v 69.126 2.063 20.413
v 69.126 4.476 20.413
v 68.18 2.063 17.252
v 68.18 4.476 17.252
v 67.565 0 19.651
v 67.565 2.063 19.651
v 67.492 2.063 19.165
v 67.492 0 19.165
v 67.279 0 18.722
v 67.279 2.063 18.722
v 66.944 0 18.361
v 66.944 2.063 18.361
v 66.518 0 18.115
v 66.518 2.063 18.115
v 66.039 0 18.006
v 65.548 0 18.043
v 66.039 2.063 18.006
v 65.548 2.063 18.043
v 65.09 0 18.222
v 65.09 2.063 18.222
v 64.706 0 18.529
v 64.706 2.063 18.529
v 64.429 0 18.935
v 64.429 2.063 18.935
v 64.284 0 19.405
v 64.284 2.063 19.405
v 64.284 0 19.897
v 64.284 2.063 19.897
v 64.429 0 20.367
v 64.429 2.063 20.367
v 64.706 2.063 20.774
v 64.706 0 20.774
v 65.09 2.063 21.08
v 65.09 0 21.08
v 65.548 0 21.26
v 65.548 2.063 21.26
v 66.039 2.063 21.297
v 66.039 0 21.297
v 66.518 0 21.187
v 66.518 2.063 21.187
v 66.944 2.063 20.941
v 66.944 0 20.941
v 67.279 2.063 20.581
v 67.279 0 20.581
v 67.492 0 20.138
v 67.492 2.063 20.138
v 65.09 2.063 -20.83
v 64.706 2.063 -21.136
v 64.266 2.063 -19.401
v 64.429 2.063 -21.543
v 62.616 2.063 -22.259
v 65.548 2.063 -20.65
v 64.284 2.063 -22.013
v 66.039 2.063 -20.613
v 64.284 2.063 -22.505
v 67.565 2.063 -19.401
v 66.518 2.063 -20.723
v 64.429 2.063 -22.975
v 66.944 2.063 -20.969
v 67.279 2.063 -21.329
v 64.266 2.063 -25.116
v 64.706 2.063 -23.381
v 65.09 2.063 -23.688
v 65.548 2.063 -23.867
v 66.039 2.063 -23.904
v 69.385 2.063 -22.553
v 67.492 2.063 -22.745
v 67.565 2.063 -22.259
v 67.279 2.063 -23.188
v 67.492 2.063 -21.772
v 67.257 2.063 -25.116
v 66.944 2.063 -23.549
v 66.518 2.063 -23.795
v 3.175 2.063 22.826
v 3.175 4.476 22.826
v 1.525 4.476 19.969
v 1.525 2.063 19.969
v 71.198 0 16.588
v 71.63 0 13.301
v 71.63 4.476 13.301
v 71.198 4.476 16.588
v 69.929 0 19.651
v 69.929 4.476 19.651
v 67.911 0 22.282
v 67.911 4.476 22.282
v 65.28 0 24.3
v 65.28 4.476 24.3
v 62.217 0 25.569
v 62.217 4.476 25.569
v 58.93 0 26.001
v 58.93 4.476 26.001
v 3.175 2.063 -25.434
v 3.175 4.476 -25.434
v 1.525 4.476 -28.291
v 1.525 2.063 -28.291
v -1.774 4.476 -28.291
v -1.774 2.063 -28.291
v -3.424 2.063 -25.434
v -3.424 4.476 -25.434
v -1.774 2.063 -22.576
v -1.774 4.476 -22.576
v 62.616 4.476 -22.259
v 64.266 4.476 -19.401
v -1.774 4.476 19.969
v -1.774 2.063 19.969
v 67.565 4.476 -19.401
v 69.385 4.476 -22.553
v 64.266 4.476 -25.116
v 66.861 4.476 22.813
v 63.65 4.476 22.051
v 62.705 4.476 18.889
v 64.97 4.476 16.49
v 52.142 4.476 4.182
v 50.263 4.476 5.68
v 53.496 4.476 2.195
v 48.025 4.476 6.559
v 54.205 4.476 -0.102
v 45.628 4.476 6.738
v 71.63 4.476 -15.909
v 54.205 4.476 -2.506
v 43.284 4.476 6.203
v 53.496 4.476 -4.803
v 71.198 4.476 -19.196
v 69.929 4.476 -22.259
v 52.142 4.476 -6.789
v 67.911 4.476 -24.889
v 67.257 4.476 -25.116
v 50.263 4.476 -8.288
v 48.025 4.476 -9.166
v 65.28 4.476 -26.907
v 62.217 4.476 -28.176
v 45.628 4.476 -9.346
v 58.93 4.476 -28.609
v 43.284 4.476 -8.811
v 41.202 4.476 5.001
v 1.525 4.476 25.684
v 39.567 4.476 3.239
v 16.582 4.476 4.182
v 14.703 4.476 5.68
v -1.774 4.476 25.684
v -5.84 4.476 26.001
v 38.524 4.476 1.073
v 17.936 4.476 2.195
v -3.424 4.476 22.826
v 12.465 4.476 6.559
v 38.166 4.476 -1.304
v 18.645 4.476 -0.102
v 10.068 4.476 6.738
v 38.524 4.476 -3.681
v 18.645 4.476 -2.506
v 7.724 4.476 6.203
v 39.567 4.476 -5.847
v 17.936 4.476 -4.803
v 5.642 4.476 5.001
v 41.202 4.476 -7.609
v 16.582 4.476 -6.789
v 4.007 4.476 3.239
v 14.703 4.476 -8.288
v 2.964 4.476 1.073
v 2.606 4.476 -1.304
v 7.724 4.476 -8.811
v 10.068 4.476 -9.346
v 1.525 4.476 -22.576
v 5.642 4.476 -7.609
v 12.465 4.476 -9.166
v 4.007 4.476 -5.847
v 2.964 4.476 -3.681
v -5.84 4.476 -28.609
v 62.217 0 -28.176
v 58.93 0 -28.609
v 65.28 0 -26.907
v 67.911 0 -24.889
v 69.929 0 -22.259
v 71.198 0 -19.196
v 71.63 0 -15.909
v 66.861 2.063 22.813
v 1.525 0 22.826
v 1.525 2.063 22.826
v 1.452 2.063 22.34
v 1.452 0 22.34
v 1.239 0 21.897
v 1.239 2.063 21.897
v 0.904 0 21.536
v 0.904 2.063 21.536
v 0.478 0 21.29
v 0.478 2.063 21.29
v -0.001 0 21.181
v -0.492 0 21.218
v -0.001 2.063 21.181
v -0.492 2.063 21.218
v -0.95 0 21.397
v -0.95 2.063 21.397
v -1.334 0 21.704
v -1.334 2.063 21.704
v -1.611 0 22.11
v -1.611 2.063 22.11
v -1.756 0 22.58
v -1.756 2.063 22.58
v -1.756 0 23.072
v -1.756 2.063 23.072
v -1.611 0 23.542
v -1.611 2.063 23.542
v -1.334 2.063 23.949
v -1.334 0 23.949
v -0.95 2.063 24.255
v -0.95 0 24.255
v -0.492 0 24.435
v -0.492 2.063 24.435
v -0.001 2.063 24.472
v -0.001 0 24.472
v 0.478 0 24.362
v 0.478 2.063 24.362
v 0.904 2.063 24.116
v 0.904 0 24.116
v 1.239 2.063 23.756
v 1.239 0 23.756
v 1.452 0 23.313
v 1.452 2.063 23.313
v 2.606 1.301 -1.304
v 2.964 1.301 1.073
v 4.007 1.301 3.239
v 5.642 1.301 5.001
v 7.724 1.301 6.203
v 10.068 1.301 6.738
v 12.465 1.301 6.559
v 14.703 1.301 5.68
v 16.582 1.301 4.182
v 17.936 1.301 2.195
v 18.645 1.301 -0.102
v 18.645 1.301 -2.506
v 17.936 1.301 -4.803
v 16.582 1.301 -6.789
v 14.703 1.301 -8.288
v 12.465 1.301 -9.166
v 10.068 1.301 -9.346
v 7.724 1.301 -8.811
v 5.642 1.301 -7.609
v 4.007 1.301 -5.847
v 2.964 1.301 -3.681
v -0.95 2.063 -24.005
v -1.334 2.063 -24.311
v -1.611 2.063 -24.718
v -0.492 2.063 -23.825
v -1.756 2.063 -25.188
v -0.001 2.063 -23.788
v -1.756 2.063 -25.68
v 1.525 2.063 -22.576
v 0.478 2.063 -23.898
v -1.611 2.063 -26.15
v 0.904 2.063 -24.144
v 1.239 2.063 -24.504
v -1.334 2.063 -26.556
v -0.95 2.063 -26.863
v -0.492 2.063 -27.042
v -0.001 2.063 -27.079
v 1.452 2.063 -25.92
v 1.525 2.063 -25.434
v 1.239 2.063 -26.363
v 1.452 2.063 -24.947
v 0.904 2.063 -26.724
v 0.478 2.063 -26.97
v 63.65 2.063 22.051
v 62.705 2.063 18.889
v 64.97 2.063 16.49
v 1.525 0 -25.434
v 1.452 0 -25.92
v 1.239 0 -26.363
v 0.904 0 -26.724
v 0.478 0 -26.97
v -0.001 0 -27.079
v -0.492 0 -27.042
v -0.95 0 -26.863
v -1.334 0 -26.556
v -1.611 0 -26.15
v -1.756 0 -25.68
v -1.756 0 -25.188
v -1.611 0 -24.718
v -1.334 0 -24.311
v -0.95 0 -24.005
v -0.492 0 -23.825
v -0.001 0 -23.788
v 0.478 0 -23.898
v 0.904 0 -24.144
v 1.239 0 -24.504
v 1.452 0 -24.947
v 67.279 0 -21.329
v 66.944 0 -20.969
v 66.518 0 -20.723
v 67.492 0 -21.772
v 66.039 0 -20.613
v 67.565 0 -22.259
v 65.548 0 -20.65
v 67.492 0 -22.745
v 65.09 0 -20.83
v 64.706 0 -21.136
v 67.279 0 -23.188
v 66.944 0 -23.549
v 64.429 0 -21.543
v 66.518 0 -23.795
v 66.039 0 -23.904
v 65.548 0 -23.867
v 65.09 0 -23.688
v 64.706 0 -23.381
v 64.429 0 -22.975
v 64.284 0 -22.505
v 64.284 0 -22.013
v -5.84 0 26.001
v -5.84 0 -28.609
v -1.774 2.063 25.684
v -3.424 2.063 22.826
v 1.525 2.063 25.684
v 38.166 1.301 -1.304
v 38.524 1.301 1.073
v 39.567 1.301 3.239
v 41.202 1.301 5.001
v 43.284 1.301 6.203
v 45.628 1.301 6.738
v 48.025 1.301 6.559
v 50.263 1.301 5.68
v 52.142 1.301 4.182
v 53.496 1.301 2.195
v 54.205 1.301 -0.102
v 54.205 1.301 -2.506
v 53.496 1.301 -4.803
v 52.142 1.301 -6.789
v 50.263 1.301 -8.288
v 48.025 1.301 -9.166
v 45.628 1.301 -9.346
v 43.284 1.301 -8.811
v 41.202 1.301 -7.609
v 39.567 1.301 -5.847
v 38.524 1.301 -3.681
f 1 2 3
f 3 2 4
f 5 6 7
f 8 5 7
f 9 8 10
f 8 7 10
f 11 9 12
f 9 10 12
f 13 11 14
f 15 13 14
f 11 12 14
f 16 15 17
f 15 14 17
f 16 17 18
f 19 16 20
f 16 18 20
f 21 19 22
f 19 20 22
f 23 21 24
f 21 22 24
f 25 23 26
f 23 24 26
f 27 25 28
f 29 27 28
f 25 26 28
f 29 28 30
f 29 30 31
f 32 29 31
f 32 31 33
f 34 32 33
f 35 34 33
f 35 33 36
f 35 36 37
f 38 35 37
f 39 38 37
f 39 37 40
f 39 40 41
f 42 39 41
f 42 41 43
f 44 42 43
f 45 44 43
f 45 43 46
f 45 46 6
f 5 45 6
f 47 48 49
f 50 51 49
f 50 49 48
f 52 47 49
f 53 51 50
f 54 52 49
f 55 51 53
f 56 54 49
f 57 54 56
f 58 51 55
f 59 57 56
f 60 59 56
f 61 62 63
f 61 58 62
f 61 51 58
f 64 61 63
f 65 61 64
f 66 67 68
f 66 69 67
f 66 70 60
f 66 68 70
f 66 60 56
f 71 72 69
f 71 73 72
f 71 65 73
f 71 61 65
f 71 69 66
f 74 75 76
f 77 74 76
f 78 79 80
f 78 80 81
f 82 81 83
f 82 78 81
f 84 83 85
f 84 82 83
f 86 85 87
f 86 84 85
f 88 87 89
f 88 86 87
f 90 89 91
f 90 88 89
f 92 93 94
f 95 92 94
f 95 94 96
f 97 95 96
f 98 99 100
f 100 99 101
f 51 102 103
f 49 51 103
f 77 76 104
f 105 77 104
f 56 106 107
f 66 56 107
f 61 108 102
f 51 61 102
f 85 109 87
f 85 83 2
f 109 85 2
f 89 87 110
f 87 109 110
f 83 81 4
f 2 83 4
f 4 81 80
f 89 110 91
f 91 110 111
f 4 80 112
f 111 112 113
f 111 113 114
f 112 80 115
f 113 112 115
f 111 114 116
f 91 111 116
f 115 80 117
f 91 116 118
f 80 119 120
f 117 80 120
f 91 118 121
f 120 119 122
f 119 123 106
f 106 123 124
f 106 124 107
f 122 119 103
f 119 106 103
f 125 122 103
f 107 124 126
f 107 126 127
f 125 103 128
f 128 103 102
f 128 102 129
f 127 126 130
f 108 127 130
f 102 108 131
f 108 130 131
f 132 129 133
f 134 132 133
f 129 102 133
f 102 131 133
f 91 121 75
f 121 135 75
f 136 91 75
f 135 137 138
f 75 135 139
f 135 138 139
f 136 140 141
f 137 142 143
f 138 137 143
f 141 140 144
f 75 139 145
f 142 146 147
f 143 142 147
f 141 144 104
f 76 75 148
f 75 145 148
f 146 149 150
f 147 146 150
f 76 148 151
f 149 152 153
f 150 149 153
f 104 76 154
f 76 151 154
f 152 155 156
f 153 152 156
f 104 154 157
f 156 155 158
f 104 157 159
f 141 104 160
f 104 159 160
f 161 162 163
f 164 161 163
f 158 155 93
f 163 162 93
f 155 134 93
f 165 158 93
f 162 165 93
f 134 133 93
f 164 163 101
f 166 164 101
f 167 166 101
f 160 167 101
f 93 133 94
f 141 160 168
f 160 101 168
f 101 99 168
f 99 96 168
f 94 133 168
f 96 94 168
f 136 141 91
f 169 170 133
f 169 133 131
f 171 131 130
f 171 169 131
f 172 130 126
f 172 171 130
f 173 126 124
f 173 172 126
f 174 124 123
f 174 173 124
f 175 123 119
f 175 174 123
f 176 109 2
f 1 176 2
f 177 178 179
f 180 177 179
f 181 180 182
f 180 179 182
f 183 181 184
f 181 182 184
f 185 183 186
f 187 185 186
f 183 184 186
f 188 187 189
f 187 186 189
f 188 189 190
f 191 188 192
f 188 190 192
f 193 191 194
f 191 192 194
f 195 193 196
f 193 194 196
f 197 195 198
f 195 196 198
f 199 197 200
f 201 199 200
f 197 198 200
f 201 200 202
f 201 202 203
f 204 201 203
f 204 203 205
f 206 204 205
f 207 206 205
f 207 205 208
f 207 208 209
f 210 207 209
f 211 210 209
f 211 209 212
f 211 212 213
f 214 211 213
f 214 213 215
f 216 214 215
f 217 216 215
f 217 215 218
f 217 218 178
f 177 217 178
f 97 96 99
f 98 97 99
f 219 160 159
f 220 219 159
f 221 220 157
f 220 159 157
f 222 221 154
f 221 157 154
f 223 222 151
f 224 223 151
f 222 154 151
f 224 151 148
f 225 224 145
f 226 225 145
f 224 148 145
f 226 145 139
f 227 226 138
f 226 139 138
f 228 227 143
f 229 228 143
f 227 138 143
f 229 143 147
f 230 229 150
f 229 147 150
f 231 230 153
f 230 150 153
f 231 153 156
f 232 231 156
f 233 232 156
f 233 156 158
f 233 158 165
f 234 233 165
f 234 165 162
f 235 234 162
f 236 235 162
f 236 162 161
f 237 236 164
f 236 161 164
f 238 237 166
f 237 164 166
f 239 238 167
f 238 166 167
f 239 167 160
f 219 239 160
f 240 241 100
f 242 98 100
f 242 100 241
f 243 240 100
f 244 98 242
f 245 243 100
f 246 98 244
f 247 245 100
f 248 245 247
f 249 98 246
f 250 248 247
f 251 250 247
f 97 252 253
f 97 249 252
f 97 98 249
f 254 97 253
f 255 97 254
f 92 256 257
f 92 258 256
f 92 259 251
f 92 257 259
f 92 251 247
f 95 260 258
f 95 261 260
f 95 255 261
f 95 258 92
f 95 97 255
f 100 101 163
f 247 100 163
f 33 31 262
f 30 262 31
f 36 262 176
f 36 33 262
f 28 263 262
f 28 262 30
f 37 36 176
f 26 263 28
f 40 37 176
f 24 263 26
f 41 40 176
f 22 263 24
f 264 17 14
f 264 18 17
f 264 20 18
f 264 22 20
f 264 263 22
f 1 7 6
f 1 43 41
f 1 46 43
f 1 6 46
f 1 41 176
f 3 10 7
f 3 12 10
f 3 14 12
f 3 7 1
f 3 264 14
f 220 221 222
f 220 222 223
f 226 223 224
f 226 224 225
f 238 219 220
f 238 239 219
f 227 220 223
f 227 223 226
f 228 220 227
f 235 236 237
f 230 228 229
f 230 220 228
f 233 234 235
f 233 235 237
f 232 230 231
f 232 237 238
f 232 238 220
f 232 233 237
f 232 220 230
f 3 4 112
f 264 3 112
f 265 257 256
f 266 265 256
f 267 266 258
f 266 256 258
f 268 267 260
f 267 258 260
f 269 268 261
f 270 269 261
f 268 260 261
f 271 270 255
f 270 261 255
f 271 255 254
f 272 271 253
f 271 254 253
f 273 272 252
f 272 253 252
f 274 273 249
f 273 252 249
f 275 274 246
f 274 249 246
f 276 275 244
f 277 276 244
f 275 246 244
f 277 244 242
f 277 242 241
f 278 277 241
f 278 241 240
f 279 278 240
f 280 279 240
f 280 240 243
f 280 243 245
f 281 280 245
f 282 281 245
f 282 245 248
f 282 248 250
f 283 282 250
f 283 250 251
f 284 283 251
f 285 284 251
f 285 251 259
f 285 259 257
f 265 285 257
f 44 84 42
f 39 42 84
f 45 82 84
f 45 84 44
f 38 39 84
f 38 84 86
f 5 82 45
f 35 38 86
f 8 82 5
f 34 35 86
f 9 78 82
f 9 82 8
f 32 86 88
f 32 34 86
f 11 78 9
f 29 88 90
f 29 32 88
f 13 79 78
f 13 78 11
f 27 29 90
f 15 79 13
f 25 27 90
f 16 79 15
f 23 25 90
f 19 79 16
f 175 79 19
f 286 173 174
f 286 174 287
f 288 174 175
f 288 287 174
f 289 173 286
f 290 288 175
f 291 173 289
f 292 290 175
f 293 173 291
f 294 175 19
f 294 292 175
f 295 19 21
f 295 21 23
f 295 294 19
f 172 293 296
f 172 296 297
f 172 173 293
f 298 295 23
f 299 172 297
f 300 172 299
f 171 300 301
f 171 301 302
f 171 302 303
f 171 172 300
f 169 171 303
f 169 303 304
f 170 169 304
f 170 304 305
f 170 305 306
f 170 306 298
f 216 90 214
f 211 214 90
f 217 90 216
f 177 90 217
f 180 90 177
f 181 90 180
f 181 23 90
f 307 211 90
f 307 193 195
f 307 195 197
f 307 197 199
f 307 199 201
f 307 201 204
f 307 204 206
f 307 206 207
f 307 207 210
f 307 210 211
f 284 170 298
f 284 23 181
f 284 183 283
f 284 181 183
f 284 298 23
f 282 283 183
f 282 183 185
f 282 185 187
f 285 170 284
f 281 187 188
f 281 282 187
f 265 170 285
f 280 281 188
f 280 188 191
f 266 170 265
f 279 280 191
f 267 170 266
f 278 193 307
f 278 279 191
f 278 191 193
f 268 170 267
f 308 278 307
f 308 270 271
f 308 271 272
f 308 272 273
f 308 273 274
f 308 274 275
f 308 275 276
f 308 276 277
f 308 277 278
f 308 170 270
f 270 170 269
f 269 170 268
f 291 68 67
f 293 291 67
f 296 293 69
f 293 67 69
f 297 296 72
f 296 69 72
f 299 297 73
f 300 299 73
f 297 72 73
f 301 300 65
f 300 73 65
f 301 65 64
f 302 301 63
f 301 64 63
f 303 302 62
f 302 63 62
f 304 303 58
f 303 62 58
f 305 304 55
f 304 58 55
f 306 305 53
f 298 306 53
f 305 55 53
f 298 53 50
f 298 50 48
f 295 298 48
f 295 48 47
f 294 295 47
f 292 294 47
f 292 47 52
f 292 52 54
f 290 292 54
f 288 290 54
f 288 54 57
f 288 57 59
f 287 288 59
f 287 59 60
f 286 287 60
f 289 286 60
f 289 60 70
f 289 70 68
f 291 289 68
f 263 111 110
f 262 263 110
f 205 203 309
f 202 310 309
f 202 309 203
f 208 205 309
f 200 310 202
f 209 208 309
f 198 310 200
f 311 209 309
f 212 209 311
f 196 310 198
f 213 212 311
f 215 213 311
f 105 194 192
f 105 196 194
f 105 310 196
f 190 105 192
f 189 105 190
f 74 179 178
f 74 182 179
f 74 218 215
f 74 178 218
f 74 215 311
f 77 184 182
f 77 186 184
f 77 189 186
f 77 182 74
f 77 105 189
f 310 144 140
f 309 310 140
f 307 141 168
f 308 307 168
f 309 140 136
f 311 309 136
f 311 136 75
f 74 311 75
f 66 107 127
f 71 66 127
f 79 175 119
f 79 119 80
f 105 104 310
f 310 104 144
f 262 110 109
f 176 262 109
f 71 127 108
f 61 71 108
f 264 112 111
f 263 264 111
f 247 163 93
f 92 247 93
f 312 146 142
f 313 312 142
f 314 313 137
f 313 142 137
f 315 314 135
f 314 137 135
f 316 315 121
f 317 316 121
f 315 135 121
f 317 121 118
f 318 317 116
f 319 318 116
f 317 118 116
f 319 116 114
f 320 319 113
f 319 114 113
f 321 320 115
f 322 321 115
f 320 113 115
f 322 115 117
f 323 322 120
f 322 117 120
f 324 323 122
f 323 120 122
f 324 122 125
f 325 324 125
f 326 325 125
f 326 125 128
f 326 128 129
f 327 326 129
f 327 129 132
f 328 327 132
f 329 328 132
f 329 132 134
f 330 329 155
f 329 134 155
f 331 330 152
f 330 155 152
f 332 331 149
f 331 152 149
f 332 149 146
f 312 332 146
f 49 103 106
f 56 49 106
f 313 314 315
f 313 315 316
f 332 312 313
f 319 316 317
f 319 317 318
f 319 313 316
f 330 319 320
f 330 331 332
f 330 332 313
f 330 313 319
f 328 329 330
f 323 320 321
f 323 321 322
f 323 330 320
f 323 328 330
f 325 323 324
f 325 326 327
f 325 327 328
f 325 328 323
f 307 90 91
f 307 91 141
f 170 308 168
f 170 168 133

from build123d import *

# Parameters (mm, degrees)
BOSS_EXTRUDE1_DEPTH = 4.476
CUT_EXTRUDE1_DEPTH  = 2.413
SKETCH4_R           = 1.65
CUT_EXTRUDE2_DEPTH  = 5.476
CUT_EXTRUDE3_DEPTH  = 3.175
SKETCH6_W           = 16.984037314
SKETCH6_H           = 62.559907231
CUT_EXTRUDE4_DEPTH  = 5.476


with BuildPart() as part:
    # Sketch1 → Boss-Extrude1 (new body)
    with BuildSketch(Plane(origin=(0, 0, 0), x_dir=(1, 0, 0), z_dir=(0, 1, 0))):
        with BuildLine():
            Line((-8.37964191, 28.608687003), (58.93035809, 28.608687003))
            ThreePointArc((58.93035809, 28.608687003), (67.910614211, 24.888943124), (71.63035809, 15.908687003))
            Line((71.63035809, 15.908687003), (71.63035809, -13.301312997))
            ThreePointArc((71.63035809, -13.301312997), (67.910614211, -22.281569118), (58.93035809, -26.001312997))
            Line((58.93035809, -26.001312997), (-8.37964191, -26.001312997))
            ThreePointArc((-8.37964191, -26.001312997), (-12.86976997, -24.141441058), (-14.72964191, -19.651312997))
            Line((-14.72964191, -19.651312997), (-14.72964191, 22.258687003))
            ThreePointArc((-14.72964191, 22.258687003), (-12.86976997, 26.748815063), (-8.37964191, 28.608687003))
        make_face()
    extrude(amount=BOSS_EXTRUDE1_DEPTH)

    # Sketch2 → Cut-Extrude1 (cut)
    with BuildSketch(Plane(origin=(0, 4.476, 0), x_dir=(1, 0, 0), z_dir=(0, 1, 0))):
        Polygon((64.265579696, 19.401187003), (67.565136484, 19.401187003), (69.384674475, 22.552719249), (67.257293816, 25.116187003), (64.265579696, 25.116187003), (62.615801302, 22.258687003), align=None)
        Polygon((69.12572552, -20.413294604), (68.180437233, -17.252044051), (64.970069804, -16.490062445), (62.704990661, -18.889331391), (63.650278947, -22.050581944), (66.860646377, -22.81256355), align=None)
        Polygon((-1.774420304, 22.576187003), (1.525136484, 22.576187003), (3.174914879, 25.433687003), (1.525136484, 28.291187003), (-1.774420304, 28.291187003), (-3.424198698, 25.433687003), align=None)
        Polygon((-1.774420304, -25.683812997), (1.525136484, -25.683812997), (3.174914879, -22.826312997), (1.525136484, -19.968812997), (-1.774420304, -19.968812997), (-3.424198698, -22.826312997), align=None)
    extrude(amount=-CUT_EXTRUDE1_DEPTH, mode=Mode.SUBTRACT)

    # Sketch4 → Cut-Extrude2 (cut, through all)
    with BuildSketch(Plane(origin=(0, 4.476, 0), x_dir=(1, 0, 0), z_dir=(0, 1, 0))):
        with Locations((-0.12464191, 25.433687003)):
            Circle(SKETCH4_R)
        with Locations((-0.12464191, -22.826312997)):
            Circle(SKETCH4_R)
        with Locations((65.91535809, -19.651312997)):
            Circle(SKETCH4_R)
        with Locations((65.91535809, 22.258687003)):
            Circle(SKETCH4_R)
    extrude(amount=-CUT_EXTRUDE2_DEPTH, mode=Mode.SUBTRACT)

    # Sketch5 → Cut-Extrude3 (cut)
    with BuildSketch(Plane(origin=(0, 4.476, 0), x_dir=(1, 0, 0), z_dir=(0, 1, 0))):
        with BuildLine():
            ThreePointArc((18.73485809, 1.303687003), (10.67035809, 9.368187003), (2.60585809, 1.303687003))
            Line((2.60585809, 1.303687003), (18.73485809, 1.303687003))
        make_face()
        with BuildLine():
            Line((18.73485809, 1.303687003), (2.60585809, 1.303687003))
            ThreePointArc((2.60585809, 1.303687003), (10.67035809, -6.760812997), (18.73485809, 1.303687003))
        make_face()
        with BuildLine():
            ThreePointArc((54.29485809, 1.303687003), (46.23035809, 9.368187003), (38.16585809, 1.303687003))
            Line((38.16585809, 1.303687003), (54.29485809, 1.303687003))
        make_face()
        with BuildLine():
            Line((54.29485809, 1.303687003), (38.16585809, 1.303687003))
            ThreePointArc((38.16585809, 1.303687003), (46.23035809, -6.760812997), (54.29485809, 1.303687003))
        make_face()
    extrude(amount=-CUT_EXTRUDE3_DEPTH, mode=Mode.SUBTRACT)

    # Sketch6 → Cut-Extrude4 (cut, through all)
    with BuildSketch(Plane(origin=(0, 4.476, 0), x_dir=(1, 0, 0), z_dir=(0, 1, 0))):
        with Locations((-14.331660567, 1.51751481)):
            Rectangle(SKETCH6_W, SKETCH6_H)
    extrude(amount=-CUT_EXTRUDE4_DEPTH, mode=Mode.SUBTRACT)


solid = part.part
